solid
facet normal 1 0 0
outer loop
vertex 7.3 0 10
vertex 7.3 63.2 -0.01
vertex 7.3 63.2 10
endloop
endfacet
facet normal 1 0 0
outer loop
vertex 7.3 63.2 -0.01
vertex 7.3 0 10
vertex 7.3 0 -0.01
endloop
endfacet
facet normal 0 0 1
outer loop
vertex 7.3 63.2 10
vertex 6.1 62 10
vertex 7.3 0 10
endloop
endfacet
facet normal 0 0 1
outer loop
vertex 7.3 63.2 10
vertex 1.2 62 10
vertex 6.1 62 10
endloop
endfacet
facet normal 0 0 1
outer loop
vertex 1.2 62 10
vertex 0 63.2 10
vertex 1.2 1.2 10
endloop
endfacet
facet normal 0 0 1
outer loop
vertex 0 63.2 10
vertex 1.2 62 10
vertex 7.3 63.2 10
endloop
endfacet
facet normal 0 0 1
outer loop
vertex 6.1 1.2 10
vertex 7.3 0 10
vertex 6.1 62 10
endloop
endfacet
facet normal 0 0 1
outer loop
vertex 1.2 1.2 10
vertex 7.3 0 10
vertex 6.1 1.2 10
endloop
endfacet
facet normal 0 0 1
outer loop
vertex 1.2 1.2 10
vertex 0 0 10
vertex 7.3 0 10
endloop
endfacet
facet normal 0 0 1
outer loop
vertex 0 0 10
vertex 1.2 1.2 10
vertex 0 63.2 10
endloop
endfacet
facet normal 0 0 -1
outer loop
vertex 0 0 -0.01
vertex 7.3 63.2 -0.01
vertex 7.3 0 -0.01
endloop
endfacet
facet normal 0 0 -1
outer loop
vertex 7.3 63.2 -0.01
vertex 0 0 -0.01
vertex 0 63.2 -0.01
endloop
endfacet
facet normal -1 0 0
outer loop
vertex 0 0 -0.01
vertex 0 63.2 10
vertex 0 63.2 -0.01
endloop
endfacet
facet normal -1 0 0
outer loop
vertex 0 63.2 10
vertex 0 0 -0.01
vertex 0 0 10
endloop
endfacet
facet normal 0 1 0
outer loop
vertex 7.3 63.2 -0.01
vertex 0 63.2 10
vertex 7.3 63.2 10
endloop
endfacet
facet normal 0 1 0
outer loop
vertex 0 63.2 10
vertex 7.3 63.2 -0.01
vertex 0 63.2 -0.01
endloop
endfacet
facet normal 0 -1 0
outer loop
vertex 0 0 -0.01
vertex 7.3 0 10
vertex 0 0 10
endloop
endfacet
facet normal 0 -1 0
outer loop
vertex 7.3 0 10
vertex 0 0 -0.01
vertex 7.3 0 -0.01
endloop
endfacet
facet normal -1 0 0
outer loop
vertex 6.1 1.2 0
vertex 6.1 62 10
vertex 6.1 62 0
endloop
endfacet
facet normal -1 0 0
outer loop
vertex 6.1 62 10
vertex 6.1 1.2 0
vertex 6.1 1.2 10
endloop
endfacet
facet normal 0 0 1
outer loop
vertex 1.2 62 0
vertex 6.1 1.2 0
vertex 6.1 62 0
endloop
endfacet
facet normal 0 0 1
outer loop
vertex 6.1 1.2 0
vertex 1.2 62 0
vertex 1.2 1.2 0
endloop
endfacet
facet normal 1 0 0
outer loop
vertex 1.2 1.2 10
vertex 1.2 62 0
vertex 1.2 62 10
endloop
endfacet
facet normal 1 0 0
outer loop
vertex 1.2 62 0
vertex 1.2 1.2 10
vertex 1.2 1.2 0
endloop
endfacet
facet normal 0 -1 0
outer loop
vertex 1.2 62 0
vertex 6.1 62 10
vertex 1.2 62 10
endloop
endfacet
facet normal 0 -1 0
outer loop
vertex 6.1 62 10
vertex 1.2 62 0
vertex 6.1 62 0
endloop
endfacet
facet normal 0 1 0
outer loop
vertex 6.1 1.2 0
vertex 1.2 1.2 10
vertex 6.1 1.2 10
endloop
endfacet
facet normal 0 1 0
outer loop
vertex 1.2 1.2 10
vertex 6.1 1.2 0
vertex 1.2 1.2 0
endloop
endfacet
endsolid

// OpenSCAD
// file: ../Base/Boxes.scad
// Fischertechnik Box Foundation
// Pre-designed Boxes

use <Constants.scad>

include <PlacementOptions.scad>

box190Width = 190;
box190Depth = 130;
box130Width = 130;
box130Depth = 95;
boxUsageHeight = 33.9;
boxWallThickness = 2.4;
boxBaseThickness = 1.0;
boxWebWidth = 3.0;

// getBoxWallThickness()
// Gets the wall thickness of a Fischertechnik Box

function getBoxWallThickness() = boxWallThickness;

// Gets the usable height of a fischertechnik box
function getBoxUsageHeight() = boxUsageHeight;

// Gets the thickness of the Fischertechnik box base.
function getBoxBaseThickness() = boxBaseThickness;

// Gets the width of a box web
function getBoxWebWidth() = boxWebWidth;

// Gets the usable inner space of a Box 190 as an x/y-list
function getBox190Space() = [
    box190Width - 2*getBoxWallThickness(), 
    box190Depth - 2*getBoxWallThickness() ];

// Imports the Fischertechnik empty box 130x190 mm and places it at position 0,0
// 190x130 are the outer sizes, the inner space is slightly smaller. Use getBox190Space() to get the inner sizes.
// This module needs the STL file "Fischertechnik Box 130x190.stl" in the library path.
// The box is positioned that the usable inner space is at the 0,0,0 position. The

module Box190() {
    translate([-getBoxWallThickness(),-getBoxWallThickness(),-getBoxBaseThickness()])
        import("Fischertechnik Box 130x190.stl", convexity=3);
}

// Gets the usable inner space of a Box 130 as an x/y-list
function getBox130Space() = [
    box130Width - 2*getBoxWallThickness(), 
    box130Depth - 2*getBoxWallThickness() ];

// Imports the Fischertechnik empty box 95x130 mm and places it at position 0,0
// 190x130 are the outer sizes, the inner space is slightly smaller. Use getBox190Space() to get the inner sizes.
// This module needs the STL file "Fischertechnik Box 95x130.stl" in the library path.
// The box is positioned that the usable inner space is at the 0,0,0 position. The

module Box130() {
    translate([-getBoxWallThickness(),-getBoxWallThickness(),-getBoxBaseThickness()])
        import("Fischertechnik Box 95x130.stl", convexity=3);
}

// Creates a web at the specified box walls
// corner 0 = LowerLeft, 1 = UpperLeft, 2 = UpperRight, 3 = LowerRight
// side 0 = LeftOfCorner, 1 = RightOfCorner
// distance = Distance in mm from the corner
// box = inner width and depth of the box (default: Box 190)
// webWidth = length of the web (default is 3 mms)
// webThickness = thickness of the web (default is 1 mm)

module BoxWeb(corner, side, distance, box=getBox190Space(), webWidth=getBoxWebWidth(), webThickness=1.0) {
    sink = getBoxWallThickness()/2;

    width = (corner % 2 == 0) ? 
            (side == LeftOfCorner ? webWidth : webThickness) :
            (side == LeftOfCorner ? webThickness : webWidth);

    depth = (corner % 2 == 0) ? 
            (side == RightOfCorner ? webWidth : webThickness) :
            (side == RightOfCorner ? webThickness : webWidth);
    
    xDiff = corner == LowerLeft ? 
                (side == LeftOfCorner ? -sink : distance) :
            (corner == UpperLeft ?                
                (side == LeftOfCorner ? distance : -sink) :
            (corner == UpperRight ?
                (side == LeftOfCorner ? box.x-webWidth+sink : box.x-distance-webThickness) :
                (side == LeftOfCorner ? box.x-distance-webThickness: box.x-webWidth+sink)));

    yDiff = corner == LowerLeft ? 
                (side == RightOfCorner ? -sink : distance) :
            (corner == UpperLeft ?
                (side == RightOfCorner ? box.y-distance : box.y-webWidth+sink) :
            (corner == UpperRight ?
                (side == RightOfCorner ? box.y-webWidth+sink : box.y-distance) :
                (side == RightOfCorner ? distance : -sink)));
    
    translate([xDiff, yDiff, -getExcess()])
        cube([width, depth, boxUsageHeight + 2*getExcess()]);
}
// file: ../Base/Rotation.scad
// Fischertechnik Box Foundation
// Geometry Helpers Rotation

include <PlacementOptions.scad>

// getRotatedSpace(space, rotation=NoRotation)
// Rotates the space dependent on the specified rotation

function getRotatedSpace(space, rotation=NoRotation) = [
    (rotation == Rotate90 || rotation == Rotate270) ? space.y : space.x,
    (rotation == Rotate90 || rotation == Rotate270) ? space.x : space.y
];

// Rotates the given space around the fixed left lower corner
// space = the space the children needs as width/depth list [width,depth]
// rotation = 0 Rotate0 degrees, 1 Rotate90 degrees, 2 Rotate180 degrees, 3 Rotate270 degrees (equivalent to -90)

module RotateFix(space, rotation=Rotate0) {
    dy = (rotation == Rotate0 || rotation == Rotate270) ? 0 :
        (rotation == Rotate90) ? space.x :
        space.y;
    dx = (rotation < Rotate180) ? 0 :
        (rotation == Rotate180) ? space.x :
        space.y;
    
    translate([dx, dy, 0])
        rotate([0, 0, rotations[rotation]])
            children();
}
// file: ../Base/Alignment.scad
// Fischertechnik Box Foundation
// Geometry Helpers Alignment

include <PlacementOptions.scad>

// getAlignedX(elementWidth, spaceWidth, align=AlignRight, offset=0)
// Gets the aligned X offset of an element with the given
// width in the given space.
// elementWidth = The width of the element to positon
// spaceWidth = The space where the element should be aligned
// align = 0 AlignLeft, 1 AlignCenter, 2 AlignRight
// offset = an optional offset from the aligned position. When
// aligned left or centered, then positive values are in X direction.
// When aligned right then positive values are in negative X direction.

function getAlignedX(elementWidth, spaceWidth, align=AlignRight, offset=0) =
    (align == AlignLeft) ?
        offset :
        ((align == AlignCenter) ?
        (spaceWidth - elementWidth)/2 + offset :
        spaceWidth - offset - elementWidth);

// getAlignedY(elementDepth, spaceDepth, align=AlignTop, offset=0)
// Gets the aligned Y offset of an element with the given
// depth in the given space.
// elementDepth = The depth of the element to positon
// spaceDepth = The space where the element should be aligned
// align = 0 AlignBottom, 1 AlignCenter, 2 AlignTop
// offset = an optional offset from the aligned position. When
// aligned bottom or centered, then positive values are in Y direction.
// When aligned top then positive values are in negative Y direction.

function getAlignedY(elementDepth, spaceDepth, align=AlignTop, offset=0) =
    (align == AlignBottom) ?
        offset :
        ((align == AlignCenter) ?
        (spaceDepth - elementDepth)/2 + offset :
        spaceDepth - offset - elementDepth);
// file: ../Base/PlacementOptions.scad
// Fischertechnik Box Foundation
// Placement Options

// Alignment
NoAlign = 0;
AlignLeft = 1;
AlignBottom = 2;
AlignCenter = 3;
AlignRight = 4;
AlignTop = 5;

// Element rotation degree steps
rotations = [0, -90, -180, -270];

// Rotation
NoRotation = 0;
Rotate0 = 0;
Rotate90 = 1;
Rotate180 = 2;
Rotate270 = 3;

// Docking (seen from above)
NoDock = -1;
DockLeft = 0;
DockTop = 1;
DockRight = 2;
DockCorner = 2;
DockBottom = 3;

// Web corners
LowerLeft = 0;
UpperLeft = 1;
UpperRight = 2;
LowerRight = 3;

// Web position relative to corner
LeftOfCorner = 0;
RightOfCorner = 1;
// file: ../Base/Placement.scad
// Fischertechnik Box Foundation
// Geometry Helpers Placement

use <Constants.scad>
use <Alignment.scad>
use <Rotation.scad>
use <Boxes.scad>

include <PlacementOptions.scad>

// Place(x=0, y=0, elementSpace=[0,0], alignX=AlignLeft, alignY=AlignBottom, rotation=Rotate0, boxSpace=getBox190Space())
// Places the child at the specified position
// y = Y-Position. This is a relative position when an X aligment is specified.
// x = X-Position. This is a relative position when an Y aligment is specified.
// elementSpace = space of the element to be placed [x,y]
// alignX = -1=NoAlign, 0 AlignLeft, 1 AlignCenter, 3 AlignRight (elementSpace and boxSpace required!)
// alignY = -1=NoAlign, 2 AlignBottom, 1 AlignCenter, 4 AlignTop (elementSpace and boxSpace required!)
// rotation = 0 Rotate0 0 degrees, 1 Rotate90 90 degrees, 
// 2 Rotate180 180 degrees, 3 Rotate270 270 degrees (equivalent to -90)
// boxSpace = Inner space of the box where the placement occurs [x,y] - default is Box 190x130 inner space

module Place(x=0, y=0, elementSpace=[0,0], 
  alignX=AlignLeft, alignY=AlignBottom, 
  rotation=NoRotation, boxSpace=getBox190Space()) {

    module Position(x, y, space, rotation=Rotate0) {
        translate([x, y, 0])
            RotateFix(space, rotation)
                children();
    }

    space = getRotatedSpace(elementSpace, rotation);
    alignedX = getAlignedX(space.x, boxSpace.x, alignX, x);
    alignedY = getAlignedY(space.y, boxSpace.y, alignY, y);
    Position(alignedX, alignedY, elementSpace, rotation)
        children();
}

// Center(space=getBox130Space(), elementSpace=[0,0])
// space = Space where the children is centered. For cylinder use centered=true and no elementSpace.
// elementSpace = space of the element to be centered [x,y]

module Center(space=getBox190Space(), elementSpace=[0,0]) {
    translate([(space.x - elementSpace.x) / 2, (space.y - elementSpace.y) / 2])
        children(0);
}

// CenterHorizontal(width=0, y=0, offset=0, space=getBox130Space())
// space = Space where the children is centered. For cylinder use centered=true and no elementSpace.
// elementSpace = space of the element to be centered [x,y]

module CenterHorizontal(width=0, y=0, offset=0, space=getBox190Space()) {
    translate([(space.x - width) / 2 + offset, y])
        children(0);
}

// CenterVertical(depth=0, x=0, offset=0, space=getBox130Space())
// space = Space where the children is centered. For cylinder use centered=true and no elementSpace.
// elementSpace = space of the element to be centered [x,y]

module CenterVertical(depth=0, x=0, offset=0, space=getBox190Space()) {
    translate([x, (space.y - depth) / 2 + offset])
        children(0);
}
// file: ../Base/Constants.scad
// Fischertechnik Box Foundation
// Constants

// Constant values necessary for multiple elements

// Base constants
dividerThickness = 1.2;
excess = 0.01;
fragments = 90;
tolerance = 0.8;

// Gets the thickness of a divider 
function getDividerThickness() = dividerThickness;

// Gets the excess that is used to merge walls into each other
function getExcess() = excess;

// Gets amount of fragments of a cylinder
function getFragments() = fragments;

// Gets the inner tolerance of a frame to each side
function getTolerance() = tolerance;


// Fischertechnik specific constants
axisDiameter = 4;
axisBottomDiameter = axisDiameter + 1;
standardEdgeDistance = 2.5;
standardWebDistance = 11.5;
standardCornerLength = 15;
tubeWallFactor = 0.8;

// Gets axis diameter
function getAxisDiameter() = axisDiameter;

// Gets axis bottom diameter for thicker part at the bottom
function getAxisBottomDiameter() = axisBottomDiameter;

// gets the standard distance to the wall of the box for dockable frames with webs
function getStandardEdgeDistance() = standardEdgeDistance;

// gets the standard distance of each web to the corner of the dockable frame
function getStandardWebDistance() = standardWebDistance;

// gets the standard length of the corner walls of a dockable frame
function getStandardCornerLength() = standardCornerLength;

// gets the wall thickness of a tube.
function getTubeWallThickness() = tubeWallFactor * getDividerThickness();
// main file
// Fischertechnik Box Library
// Frame for Flat Pieces 60
// 31555

use <../ModelBase/Complex.scad>

size = 60;

// getFrameFlatPiece60Space(count)
// count = count of pieces in X direction
// Gets the space for a frame for flat pieces 60.

function getFrameFlatPiece60Space(count=1) = getFrameFlatPieceVolume(count, size);

// FrameFlatPiece30(count)
// count = Count of flat pieces 60 in X direction

module FrameFlatPiece60(count=1) {  
    FrameFlatPiece(count, size);
}

// Tests
color("lightgray") {
FrameFlatPiece60();
}
